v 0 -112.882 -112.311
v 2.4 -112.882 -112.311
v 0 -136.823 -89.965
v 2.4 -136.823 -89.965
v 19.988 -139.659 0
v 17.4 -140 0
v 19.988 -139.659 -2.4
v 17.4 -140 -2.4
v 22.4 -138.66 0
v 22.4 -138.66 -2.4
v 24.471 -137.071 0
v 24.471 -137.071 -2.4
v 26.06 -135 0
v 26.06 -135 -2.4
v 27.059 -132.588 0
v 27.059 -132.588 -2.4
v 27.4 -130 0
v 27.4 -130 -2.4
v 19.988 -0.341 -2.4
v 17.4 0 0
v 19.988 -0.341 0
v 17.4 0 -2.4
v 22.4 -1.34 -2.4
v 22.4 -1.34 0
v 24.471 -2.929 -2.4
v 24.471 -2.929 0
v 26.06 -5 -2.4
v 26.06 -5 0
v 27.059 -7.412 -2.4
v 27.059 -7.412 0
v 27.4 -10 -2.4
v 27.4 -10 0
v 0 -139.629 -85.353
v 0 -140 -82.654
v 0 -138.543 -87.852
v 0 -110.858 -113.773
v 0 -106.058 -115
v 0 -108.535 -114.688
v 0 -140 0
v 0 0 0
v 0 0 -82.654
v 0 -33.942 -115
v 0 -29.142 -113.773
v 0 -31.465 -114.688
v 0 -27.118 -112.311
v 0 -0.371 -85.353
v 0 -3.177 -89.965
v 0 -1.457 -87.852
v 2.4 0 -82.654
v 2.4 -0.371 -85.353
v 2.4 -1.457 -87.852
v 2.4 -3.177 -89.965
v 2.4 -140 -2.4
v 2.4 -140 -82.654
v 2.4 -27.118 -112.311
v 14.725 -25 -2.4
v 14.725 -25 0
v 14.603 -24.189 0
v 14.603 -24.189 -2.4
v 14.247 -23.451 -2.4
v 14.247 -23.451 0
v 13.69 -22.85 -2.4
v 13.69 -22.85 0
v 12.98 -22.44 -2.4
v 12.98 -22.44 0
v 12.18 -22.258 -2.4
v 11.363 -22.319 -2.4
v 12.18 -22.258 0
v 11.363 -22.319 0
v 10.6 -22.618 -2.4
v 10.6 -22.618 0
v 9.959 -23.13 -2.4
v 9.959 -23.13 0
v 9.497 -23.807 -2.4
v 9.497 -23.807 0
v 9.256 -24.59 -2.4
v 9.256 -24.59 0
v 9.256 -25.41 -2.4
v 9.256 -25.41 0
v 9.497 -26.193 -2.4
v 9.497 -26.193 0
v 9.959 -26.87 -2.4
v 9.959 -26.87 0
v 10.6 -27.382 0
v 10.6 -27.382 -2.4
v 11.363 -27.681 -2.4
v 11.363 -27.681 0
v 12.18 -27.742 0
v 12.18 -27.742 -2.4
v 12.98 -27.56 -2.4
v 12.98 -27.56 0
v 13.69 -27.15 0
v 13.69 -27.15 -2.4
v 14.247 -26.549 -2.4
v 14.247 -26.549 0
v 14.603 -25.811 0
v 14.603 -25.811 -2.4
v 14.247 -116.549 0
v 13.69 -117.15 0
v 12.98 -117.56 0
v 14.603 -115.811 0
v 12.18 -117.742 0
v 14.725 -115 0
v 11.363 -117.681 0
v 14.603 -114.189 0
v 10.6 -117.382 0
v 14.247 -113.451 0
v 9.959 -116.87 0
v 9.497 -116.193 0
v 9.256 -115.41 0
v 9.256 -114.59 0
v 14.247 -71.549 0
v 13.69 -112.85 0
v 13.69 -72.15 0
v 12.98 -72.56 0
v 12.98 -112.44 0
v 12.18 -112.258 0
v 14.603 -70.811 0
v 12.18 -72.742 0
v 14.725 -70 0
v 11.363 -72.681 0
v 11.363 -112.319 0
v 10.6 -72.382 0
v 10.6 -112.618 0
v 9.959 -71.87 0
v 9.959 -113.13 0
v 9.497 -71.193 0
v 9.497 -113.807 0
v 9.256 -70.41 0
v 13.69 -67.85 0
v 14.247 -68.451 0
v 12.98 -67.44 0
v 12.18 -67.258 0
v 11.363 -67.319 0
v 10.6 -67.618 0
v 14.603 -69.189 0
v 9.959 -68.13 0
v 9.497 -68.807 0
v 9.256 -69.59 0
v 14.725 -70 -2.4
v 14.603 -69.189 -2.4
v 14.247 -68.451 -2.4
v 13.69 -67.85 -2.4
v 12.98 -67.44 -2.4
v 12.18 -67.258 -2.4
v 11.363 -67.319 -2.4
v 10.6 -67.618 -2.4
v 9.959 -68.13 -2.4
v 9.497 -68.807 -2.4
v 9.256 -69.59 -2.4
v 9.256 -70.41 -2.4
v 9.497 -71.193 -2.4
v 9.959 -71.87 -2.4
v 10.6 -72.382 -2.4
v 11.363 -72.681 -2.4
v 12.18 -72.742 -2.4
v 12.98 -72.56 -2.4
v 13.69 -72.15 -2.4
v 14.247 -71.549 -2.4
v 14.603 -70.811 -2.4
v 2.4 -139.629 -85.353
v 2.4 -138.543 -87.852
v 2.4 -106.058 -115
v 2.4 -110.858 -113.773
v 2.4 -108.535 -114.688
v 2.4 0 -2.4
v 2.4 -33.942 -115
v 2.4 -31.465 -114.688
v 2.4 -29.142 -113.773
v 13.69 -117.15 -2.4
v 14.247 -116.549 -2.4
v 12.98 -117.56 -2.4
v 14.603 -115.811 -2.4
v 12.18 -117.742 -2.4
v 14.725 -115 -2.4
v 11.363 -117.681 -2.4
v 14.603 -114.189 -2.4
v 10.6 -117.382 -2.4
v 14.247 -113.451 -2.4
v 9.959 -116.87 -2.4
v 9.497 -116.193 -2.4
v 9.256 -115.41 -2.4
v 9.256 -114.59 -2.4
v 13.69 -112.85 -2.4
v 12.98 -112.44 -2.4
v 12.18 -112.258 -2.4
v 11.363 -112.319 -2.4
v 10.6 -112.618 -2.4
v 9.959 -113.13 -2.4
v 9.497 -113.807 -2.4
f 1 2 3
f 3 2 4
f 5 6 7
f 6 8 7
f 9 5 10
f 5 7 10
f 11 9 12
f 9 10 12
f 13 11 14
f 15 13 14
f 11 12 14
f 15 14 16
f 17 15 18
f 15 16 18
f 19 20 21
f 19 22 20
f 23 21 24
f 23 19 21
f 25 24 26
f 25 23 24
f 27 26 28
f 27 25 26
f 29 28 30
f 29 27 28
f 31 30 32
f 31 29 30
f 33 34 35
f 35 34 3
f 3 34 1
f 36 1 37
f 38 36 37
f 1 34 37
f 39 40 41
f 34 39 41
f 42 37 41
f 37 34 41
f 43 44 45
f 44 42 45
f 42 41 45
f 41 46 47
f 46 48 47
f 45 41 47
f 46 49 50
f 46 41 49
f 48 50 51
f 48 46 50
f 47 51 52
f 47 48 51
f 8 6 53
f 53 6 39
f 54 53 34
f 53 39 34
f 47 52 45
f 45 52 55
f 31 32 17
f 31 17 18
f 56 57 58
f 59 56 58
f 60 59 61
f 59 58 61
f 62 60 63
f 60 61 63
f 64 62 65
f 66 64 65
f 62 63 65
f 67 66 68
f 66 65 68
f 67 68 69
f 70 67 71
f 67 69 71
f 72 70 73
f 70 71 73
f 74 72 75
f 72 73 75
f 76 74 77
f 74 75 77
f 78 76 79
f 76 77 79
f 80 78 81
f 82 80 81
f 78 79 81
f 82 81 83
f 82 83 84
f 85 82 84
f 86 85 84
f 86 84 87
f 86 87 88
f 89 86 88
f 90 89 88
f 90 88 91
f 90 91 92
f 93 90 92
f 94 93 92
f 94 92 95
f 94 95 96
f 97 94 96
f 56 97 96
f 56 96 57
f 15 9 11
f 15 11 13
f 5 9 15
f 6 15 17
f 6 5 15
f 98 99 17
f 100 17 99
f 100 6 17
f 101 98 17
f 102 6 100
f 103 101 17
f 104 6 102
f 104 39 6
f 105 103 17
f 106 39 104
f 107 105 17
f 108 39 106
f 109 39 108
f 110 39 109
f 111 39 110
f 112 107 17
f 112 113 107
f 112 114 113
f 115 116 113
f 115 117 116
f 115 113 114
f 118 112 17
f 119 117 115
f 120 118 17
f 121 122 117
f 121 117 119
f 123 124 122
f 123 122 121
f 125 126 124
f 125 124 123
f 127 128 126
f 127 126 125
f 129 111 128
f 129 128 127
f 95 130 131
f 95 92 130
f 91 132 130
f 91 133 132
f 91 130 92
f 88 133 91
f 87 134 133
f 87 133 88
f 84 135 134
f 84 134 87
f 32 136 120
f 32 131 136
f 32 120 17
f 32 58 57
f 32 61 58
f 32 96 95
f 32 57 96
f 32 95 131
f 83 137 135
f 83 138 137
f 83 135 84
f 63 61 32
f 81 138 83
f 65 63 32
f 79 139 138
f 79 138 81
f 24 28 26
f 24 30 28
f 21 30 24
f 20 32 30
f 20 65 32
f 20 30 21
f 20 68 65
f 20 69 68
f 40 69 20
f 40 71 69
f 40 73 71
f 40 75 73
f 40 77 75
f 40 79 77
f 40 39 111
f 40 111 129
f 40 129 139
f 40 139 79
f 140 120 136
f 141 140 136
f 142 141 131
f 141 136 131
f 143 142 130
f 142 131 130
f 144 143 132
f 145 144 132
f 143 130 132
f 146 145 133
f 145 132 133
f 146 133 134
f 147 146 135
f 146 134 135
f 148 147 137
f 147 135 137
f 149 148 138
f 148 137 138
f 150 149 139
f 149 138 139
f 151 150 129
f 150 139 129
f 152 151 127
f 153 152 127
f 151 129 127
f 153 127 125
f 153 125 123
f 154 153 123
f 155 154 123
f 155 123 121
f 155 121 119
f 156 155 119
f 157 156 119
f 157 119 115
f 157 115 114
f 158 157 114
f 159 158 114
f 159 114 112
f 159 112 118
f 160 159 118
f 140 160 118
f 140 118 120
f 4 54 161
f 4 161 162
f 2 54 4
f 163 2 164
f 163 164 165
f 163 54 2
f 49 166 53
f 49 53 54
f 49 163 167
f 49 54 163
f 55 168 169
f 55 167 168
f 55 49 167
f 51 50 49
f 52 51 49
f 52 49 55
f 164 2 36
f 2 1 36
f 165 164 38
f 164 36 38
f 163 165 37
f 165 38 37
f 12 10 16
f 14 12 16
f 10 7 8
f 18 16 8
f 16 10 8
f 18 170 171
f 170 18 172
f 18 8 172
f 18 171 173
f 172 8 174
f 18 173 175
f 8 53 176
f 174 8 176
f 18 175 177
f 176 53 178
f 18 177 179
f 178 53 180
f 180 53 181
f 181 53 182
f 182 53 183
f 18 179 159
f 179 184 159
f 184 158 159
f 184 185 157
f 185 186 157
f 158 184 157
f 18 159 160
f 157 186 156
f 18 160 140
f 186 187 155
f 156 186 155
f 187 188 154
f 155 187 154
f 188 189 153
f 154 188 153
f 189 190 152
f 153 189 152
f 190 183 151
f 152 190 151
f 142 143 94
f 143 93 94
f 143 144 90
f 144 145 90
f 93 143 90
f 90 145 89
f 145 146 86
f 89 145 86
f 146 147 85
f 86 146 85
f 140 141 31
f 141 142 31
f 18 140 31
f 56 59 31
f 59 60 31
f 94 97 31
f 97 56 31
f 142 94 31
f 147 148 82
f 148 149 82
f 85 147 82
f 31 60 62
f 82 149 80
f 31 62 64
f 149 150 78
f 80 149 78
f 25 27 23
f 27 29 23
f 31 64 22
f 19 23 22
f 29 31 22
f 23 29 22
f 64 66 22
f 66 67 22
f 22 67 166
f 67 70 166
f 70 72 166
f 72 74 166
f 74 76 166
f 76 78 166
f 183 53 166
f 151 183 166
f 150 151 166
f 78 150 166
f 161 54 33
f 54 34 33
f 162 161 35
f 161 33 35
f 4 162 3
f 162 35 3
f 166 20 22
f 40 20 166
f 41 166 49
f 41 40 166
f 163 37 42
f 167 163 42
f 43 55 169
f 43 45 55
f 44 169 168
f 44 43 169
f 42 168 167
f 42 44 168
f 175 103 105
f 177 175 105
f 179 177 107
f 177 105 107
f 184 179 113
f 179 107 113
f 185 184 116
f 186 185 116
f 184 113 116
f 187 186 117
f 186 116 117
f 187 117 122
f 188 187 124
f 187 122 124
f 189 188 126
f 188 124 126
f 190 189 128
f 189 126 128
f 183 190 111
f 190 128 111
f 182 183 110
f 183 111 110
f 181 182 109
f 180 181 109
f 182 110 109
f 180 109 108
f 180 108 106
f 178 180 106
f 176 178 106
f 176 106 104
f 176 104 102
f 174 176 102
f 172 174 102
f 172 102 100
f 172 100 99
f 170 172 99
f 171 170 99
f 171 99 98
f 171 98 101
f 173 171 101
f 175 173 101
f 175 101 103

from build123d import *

# Parameters (mm, degrees)
SKETCH1_W           = 115
SKETCH1_H           = 140
BOSS_EXTRUDE1_DEPTH = 2.4
CUT_EXTRUDE1_DEPTH  = 3.4
FILLET1_R           = 10
SKETCH3_W           = 2.4
SKETCH3_H           = 140
BOSS_EXTRUDE2_DEPTH = 25
FILLET2_R           = 10
SKETCH4_R           = 2.75
CUT_EXTRUDE2_DEPTH  = 116


with BuildPart() as part:
    # Sketch1 → Boss-Extrude1 (new body)
    with BuildSketch(Plane(origin=(0, 0, 0), x_dir=(0, 0, -1), z_dir=(1, 0, 0))):
        with Locations((57.5, -70)):
            Rectangle(SKETCH1_W, SKETCH1_H)
    extrude(amount=BOSS_EXTRUDE1_DEPTH)

    # Sketch2 → Cut-Extrude1 (cut, through all)
    with BuildSketch(Plane(origin=(2.4, 0, 0), x_dir=(0, 0, -1), z_dir=(1, 0, 0))):
        Polygon((87, 0), (115, -30), (142.616199658, -32.505405645), (142.616199658, 14.875556406), align=None)
        Polygon((115, -110), (87, -140), (87, -152.661109726), (136.310004643, -152.661109726), align=None)
    extrude(amount=-CUT_EXTRUDE1_DEPTH, mode=Mode.SUBTRACT)

    # Fillet1
    fillet1_edges = [part.edges().sort_by_distance(p)[0] for p in [
        (1.2, 0, -87),
        (1.2, -30, -115),
        (1.2, -110, -115),
        (1.2, -140, -87),
    ]]
    fillet(fillet1_edges, radius=FILLET1_R)

    # Sketch3 → Boss-Extrude2 (add)
    with BuildSketch(Plane(origin=(2.4, 0, 0), x_dir=(0, 0, -1), z_dir=(1, 0, 0))):
        with Locations((1.2, -70)):
            Rectangle(SKETCH3_W, SKETCH3_H)
    extrude(amount=BOSS_EXTRUDE2_DEPTH)

    # Fillet2
    fillet2_edges = [part.edges().sort_by_distance(p)[0] for p in [
        (27.4, -140, -1.2),
        (27.4, 0, -1.2),
    ]]
    fillet(fillet2_edges, radius=FILLET2_R)

    # Sketch4 → Cut-Extrude2 (cut, through all)
    with BuildSketch(Plane.XY):
        with Locations((11.974983581, -70)):
            Circle(SKETCH4_R)
        with Locations((11.974983581, -25)):
            Circle(SKETCH4_R)
        with Locations((11.974983581, -115)):
            Circle(SKETCH4_R)
    extrude(amount=-CUT_EXTRUDE2_DEPTH, mode=Mode.SUBTRACT)


solid = part.part
